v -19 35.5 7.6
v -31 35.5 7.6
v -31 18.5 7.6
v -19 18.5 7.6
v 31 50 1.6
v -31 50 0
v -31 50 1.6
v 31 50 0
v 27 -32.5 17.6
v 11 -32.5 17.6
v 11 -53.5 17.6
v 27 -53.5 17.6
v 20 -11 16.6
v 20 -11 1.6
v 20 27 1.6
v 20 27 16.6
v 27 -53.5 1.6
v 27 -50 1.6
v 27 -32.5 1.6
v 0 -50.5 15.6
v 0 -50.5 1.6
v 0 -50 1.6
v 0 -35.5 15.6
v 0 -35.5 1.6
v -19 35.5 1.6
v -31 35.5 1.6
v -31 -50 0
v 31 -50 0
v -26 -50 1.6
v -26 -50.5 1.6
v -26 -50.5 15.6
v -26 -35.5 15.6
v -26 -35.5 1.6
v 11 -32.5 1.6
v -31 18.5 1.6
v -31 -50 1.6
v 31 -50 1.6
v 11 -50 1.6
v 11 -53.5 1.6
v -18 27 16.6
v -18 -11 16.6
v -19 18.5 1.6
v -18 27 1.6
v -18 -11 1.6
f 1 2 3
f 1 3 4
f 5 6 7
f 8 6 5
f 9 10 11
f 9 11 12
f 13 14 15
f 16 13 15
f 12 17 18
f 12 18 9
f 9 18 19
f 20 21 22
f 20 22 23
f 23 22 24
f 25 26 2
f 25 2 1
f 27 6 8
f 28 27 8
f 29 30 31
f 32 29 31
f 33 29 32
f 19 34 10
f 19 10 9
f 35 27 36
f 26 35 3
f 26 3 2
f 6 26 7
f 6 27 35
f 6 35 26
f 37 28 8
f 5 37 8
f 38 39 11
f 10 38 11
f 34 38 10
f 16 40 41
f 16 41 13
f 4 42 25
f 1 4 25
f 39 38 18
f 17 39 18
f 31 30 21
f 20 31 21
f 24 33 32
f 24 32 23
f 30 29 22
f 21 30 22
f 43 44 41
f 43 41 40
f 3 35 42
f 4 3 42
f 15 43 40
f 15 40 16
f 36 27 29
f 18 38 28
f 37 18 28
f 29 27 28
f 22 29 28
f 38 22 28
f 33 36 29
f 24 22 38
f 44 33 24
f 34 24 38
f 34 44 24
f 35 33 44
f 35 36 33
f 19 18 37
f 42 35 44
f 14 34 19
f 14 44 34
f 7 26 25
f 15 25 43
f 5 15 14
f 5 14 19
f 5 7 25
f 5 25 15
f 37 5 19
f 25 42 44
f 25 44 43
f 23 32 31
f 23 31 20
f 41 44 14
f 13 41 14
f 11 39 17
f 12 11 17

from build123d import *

# Parameters (mm, degrees)
SKETCH_1_W           = 62
SKETCH_1_H           = 100
F_5_PCB_100X62_DEPTH = 1.6
EXTRUDE_START        = 1.6
SKETCH_2_W           = 16
SKETCH_2_H           = 21
EXTRUDE_312_DEPTH    = 16
USB_START            = 1.6
SKETCH_3_W           = 26
SKETCH_3_H           = 15
USB_DEPTH            = 14
SKETCH_4_W           = 12
SKETCH_4_H           = 17
EXTRUDE_463_DEPTH    = 6
SKETCH_5_W           = 38
SKETCH_5_H           = 38
EXTRUDE_553_DEPTH    = 15


with BuildPart() as part:
    # 草图1 → 香橙派5_PCB官方外形100x62 (new body)
    with BuildSketch(Plane.XY):
        Rectangle(SKETCH_1_W, SKETCH_1_H)
    extrude(amount=F_5_PCB_100X62_DEPTH)

    # 草图2 → Extrude 312 (add)
    with BuildSketch(Plane.XY.offset(EXTRUDE_START)):
        with Locations((19, -43)):
            Rectangle(SKETCH_2_W, SKETCH_2_H)
    extrude(amount=EXTRUDE_312_DEPTH)

    # 草图3 → USB插拔包络_需按实物替换 (add)
    with BuildSketch(Plane.XY.offset(USB_START)):
        with Locations((-13, -43)):
            Rectangle(SKETCH_3_W, SKETCH_3_H)
    extrude(amount=USB_DEPTH)

    # 草图4 → Extrude 463 (add)
    with BuildSketch(Plane.XY.offset(EXTRUDE_START)):
        with Locations((-25, 27)):
            Rectangle(SKETCH_4_W, SKETCH_4_H)
    extrude(amount=EXTRUDE_463_DEPTH)

    # 草图5 → Extrude 553 (add)
    with BuildSketch(Plane.XY.offset(EXTRUDE_START)):
        with Locations((1, 8)):
            Rectangle(SKETCH_5_W, SKETCH_5_H)
    extrude(amount=EXTRUDE_553_DEPTH)


solid = part.part
